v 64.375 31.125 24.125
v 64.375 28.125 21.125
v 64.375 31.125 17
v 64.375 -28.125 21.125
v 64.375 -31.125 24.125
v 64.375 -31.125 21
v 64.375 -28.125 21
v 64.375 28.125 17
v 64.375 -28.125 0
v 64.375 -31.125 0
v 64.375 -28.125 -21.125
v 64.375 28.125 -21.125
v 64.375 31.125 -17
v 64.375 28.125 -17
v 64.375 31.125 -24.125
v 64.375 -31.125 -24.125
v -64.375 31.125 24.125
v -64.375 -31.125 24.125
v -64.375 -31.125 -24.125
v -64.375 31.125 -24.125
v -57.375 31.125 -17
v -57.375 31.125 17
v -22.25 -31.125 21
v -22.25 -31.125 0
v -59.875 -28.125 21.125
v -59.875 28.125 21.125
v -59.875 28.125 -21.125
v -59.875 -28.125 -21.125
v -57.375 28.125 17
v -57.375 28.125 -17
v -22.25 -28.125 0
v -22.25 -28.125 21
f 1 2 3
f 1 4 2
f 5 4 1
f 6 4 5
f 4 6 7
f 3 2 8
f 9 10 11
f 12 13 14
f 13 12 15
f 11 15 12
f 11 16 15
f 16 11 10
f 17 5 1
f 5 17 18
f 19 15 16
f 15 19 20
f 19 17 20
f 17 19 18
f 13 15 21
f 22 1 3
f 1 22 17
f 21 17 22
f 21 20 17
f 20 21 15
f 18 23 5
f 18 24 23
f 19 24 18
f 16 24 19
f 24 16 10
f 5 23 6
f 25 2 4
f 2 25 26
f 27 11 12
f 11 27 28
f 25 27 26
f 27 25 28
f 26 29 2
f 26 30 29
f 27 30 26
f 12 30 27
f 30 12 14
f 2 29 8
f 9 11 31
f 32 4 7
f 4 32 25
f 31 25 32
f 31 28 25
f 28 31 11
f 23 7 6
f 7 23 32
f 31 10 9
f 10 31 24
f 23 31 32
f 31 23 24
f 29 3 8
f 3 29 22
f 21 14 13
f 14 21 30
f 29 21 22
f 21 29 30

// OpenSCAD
// file: constants.scad
bodyWidht = 122.5;   // x
bodyLenght = 56;     // y
bodyHeight = 42;     // z

shell = 3;
allowence = 0.25;

railSide = 18.2;

clipLip = 10;

shelfWidth = 358.775;

// this was something that I had to add after printing
xFudge = 11;

bodyVoidH = bodyHeight + allowence;
bodyVoidL = bodyLenght + allowence;
bodyVoidW = bodyWidht + allowence;

shellW = bodyVoidW + 2 * shell;  // x
shellL = bodyVoidL + 2 * shell;  // y
shellH = bodyVoidH + 2 * shell;  // z

receiverW = 30+ xFudge;
foundationL = shellL;
foundationW = shelfWidth / 2  - shellW / 2 + receiverW;

rcvrVoidW = receiverW - shell - allowence;
rcvrVoidL = bodyVoidL;
rcvrVoidH = bodyVoidH;

// how much space is between the end of the body and the tubes
tuberInset = 7.5;

// distance to shift in the y axis 
ribOffset = foundationL/2 * 2/3;

wireDia = 5; // 4.7 + sum padding
wireAllowance = railSide / 2;

clipWidth = 25;
// main file
include <constants.scad>




//railTest();


difference() {
    cube ([shellW, shellL, shellH], true);
    translate ([shell,0, 0])
    cube ([bodyVoidW+ shell, bodyVoidL, bodyVoidH], true);
    outerWindow() ;
    innerWindow();
}


module outerWindow() {

    sideVoidH = bodyHeight / 2;
    sideVoidW = bodyWidht - 35;

    translate([sideVoidH / 2 + 11, -5, sideVoidH/2]) 
    cube ([sideVoidW, shellL , sideVoidH], true);

}

module innerWindow() {

    innerWing = 4;

    innerWingVoidH = shellH - innerWing * 2 - allowence - shell * 2;

    translate([shell + 1, bodyVoidL / 2, 0]) 
    cube([bodyVoidW, 10, innerWingVoidH], true);
    
}

module railTest() {

    railVoidWidth = railSide +  allowence  ;
    railEnclosureWidth = shell * 2 + railVoidWidth;

    difference() {
        cube ([railEnclosureWidth, railEnclosureWidth, 25]);
        translate ([-1, shell, shell])
        cube ([railEnclosureWidth + 2, railVoidWidth, 27]);
    }

}
